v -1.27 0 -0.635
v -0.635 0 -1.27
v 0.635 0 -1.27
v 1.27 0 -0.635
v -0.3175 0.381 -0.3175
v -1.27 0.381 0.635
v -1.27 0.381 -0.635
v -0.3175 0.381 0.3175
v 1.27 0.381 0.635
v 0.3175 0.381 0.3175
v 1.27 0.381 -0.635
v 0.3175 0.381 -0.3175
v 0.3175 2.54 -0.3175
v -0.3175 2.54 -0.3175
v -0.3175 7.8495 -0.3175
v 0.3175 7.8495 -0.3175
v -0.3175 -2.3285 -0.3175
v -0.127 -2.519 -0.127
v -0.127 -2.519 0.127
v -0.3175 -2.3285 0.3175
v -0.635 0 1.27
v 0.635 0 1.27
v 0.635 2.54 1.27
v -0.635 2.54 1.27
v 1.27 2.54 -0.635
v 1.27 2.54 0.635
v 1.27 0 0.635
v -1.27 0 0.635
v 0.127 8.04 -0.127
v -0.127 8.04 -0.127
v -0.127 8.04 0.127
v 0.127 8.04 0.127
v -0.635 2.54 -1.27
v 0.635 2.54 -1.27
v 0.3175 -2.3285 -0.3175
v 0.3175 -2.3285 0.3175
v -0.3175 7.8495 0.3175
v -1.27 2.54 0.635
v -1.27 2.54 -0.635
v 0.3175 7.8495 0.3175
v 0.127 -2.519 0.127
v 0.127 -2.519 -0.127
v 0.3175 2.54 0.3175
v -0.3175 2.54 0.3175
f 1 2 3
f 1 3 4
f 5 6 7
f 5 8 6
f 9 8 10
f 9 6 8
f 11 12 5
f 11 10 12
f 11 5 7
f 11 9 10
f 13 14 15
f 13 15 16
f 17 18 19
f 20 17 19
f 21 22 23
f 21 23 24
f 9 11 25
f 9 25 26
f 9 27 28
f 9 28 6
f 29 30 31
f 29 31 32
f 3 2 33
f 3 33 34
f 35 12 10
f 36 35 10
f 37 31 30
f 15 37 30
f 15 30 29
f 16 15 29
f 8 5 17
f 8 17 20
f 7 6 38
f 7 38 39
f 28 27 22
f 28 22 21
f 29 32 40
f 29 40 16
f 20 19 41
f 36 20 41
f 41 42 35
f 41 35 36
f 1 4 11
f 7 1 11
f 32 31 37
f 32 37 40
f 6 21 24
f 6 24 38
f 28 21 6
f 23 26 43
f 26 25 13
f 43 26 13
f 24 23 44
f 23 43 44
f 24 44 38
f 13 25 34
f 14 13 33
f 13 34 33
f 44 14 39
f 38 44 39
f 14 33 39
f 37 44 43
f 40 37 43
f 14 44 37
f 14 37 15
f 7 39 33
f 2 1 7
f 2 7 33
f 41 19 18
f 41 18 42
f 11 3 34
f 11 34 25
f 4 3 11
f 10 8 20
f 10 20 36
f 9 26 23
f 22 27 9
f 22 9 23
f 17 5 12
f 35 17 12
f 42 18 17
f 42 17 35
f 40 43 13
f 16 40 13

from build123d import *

# Parameters (mm, degrees)
BOSS_EXTRUDE1_DEPTH = 2.54
SKETCH2_W           = 1.27
SKETCH2_H           = 0.381
CUT_EXTRUDE1_DEPTH  = 2.54
SKETCH3_W           = 0.635
SKETCH3_H           = 0.635
BOSS_EXTRUDE2_DEPTH = 5.5
CHAMFER1_SIZE       = 0.1905
SKETCH4_W           = 0.635
SKETCH4_H           = 0.635
BOSS_EXTRUDE3_DEPTH = 2.9
CHAMFER2_SIZE       = 0.1905


with BuildPart() as part:
    # Sketch1 → Boss-Extrude1 (new body)
    with BuildSketch(Plane(origin=(0, 0, 0), x_dir=(1, 0, 0), z_dir=(0, 1, 0))):
        Polygon((0.635, 1.27), (1.27, 0.635), (1.27, -0.635), (0.635, -1.27), (-0.635, -1.27), (-1.27, -0.635), (-1.27, 0.635), (-0.635, 1.27), align=None)
    extrude(amount=BOSS_EXTRUDE1_DEPTH)

    # Sketch2 → Cut-Extrude1 (cut)
    with BuildSketch(Plane(origin=(1.27, 0, 0), x_dir=(0, 0, -1), z_dir=(1, 0, 0))):
        with Locations((0, 0.1905)):
            Rectangle(SKETCH2_W, SKETCH2_H)
    extrude(amount=-CUT_EXTRUDE1_DEPTH, mode=Mode.SUBTRACT)

    # Sketch3 → Boss-Extrude2 (add)
    with BuildSketch(Plane(origin=(0, 2.54, 0), x_dir=(1, 0, 0), z_dir=(0, 1, 0))):
        Rectangle(SKETCH3_W, SKETCH3_H)
    extrude(amount=BOSS_EXTRUDE2_DEPTH)

    # Chamfer1
    chamfer1_edges = [part.edges().sort_by_distance(p)[0] for p in [
        (0.3175, 8.04, 0),
        (0, 8.04, -0.3175),
        (-0.3175, 8.04, 0),
        (0, 8.04, 0.3175),
    ]]
    chamfer(chamfer1_edges, length=CHAMFER1_SIZE)

    # Sketch4 → Boss-Extrude3 (add)
    with BuildSketch(Plane.XZ.offset(-0.381)):
        Rectangle(SKETCH4_W, SKETCH4_H)
    extrude(amount=BOSS_EXTRUDE3_DEPTH)

    # Chamfer2
    chamfer2_edges = [part.edges().sort_by_distance(p)[0] for p in [
        (0.3175, -2.519, 0),
        (0, -2.519, 0.3175),
        (-0.3175, -2.519, 0),
        (0, -2.519, -0.3175),
    ]]
    chamfer(chamfer2_edges, length=CHAMFER2_SIZE)


solid = part.part
